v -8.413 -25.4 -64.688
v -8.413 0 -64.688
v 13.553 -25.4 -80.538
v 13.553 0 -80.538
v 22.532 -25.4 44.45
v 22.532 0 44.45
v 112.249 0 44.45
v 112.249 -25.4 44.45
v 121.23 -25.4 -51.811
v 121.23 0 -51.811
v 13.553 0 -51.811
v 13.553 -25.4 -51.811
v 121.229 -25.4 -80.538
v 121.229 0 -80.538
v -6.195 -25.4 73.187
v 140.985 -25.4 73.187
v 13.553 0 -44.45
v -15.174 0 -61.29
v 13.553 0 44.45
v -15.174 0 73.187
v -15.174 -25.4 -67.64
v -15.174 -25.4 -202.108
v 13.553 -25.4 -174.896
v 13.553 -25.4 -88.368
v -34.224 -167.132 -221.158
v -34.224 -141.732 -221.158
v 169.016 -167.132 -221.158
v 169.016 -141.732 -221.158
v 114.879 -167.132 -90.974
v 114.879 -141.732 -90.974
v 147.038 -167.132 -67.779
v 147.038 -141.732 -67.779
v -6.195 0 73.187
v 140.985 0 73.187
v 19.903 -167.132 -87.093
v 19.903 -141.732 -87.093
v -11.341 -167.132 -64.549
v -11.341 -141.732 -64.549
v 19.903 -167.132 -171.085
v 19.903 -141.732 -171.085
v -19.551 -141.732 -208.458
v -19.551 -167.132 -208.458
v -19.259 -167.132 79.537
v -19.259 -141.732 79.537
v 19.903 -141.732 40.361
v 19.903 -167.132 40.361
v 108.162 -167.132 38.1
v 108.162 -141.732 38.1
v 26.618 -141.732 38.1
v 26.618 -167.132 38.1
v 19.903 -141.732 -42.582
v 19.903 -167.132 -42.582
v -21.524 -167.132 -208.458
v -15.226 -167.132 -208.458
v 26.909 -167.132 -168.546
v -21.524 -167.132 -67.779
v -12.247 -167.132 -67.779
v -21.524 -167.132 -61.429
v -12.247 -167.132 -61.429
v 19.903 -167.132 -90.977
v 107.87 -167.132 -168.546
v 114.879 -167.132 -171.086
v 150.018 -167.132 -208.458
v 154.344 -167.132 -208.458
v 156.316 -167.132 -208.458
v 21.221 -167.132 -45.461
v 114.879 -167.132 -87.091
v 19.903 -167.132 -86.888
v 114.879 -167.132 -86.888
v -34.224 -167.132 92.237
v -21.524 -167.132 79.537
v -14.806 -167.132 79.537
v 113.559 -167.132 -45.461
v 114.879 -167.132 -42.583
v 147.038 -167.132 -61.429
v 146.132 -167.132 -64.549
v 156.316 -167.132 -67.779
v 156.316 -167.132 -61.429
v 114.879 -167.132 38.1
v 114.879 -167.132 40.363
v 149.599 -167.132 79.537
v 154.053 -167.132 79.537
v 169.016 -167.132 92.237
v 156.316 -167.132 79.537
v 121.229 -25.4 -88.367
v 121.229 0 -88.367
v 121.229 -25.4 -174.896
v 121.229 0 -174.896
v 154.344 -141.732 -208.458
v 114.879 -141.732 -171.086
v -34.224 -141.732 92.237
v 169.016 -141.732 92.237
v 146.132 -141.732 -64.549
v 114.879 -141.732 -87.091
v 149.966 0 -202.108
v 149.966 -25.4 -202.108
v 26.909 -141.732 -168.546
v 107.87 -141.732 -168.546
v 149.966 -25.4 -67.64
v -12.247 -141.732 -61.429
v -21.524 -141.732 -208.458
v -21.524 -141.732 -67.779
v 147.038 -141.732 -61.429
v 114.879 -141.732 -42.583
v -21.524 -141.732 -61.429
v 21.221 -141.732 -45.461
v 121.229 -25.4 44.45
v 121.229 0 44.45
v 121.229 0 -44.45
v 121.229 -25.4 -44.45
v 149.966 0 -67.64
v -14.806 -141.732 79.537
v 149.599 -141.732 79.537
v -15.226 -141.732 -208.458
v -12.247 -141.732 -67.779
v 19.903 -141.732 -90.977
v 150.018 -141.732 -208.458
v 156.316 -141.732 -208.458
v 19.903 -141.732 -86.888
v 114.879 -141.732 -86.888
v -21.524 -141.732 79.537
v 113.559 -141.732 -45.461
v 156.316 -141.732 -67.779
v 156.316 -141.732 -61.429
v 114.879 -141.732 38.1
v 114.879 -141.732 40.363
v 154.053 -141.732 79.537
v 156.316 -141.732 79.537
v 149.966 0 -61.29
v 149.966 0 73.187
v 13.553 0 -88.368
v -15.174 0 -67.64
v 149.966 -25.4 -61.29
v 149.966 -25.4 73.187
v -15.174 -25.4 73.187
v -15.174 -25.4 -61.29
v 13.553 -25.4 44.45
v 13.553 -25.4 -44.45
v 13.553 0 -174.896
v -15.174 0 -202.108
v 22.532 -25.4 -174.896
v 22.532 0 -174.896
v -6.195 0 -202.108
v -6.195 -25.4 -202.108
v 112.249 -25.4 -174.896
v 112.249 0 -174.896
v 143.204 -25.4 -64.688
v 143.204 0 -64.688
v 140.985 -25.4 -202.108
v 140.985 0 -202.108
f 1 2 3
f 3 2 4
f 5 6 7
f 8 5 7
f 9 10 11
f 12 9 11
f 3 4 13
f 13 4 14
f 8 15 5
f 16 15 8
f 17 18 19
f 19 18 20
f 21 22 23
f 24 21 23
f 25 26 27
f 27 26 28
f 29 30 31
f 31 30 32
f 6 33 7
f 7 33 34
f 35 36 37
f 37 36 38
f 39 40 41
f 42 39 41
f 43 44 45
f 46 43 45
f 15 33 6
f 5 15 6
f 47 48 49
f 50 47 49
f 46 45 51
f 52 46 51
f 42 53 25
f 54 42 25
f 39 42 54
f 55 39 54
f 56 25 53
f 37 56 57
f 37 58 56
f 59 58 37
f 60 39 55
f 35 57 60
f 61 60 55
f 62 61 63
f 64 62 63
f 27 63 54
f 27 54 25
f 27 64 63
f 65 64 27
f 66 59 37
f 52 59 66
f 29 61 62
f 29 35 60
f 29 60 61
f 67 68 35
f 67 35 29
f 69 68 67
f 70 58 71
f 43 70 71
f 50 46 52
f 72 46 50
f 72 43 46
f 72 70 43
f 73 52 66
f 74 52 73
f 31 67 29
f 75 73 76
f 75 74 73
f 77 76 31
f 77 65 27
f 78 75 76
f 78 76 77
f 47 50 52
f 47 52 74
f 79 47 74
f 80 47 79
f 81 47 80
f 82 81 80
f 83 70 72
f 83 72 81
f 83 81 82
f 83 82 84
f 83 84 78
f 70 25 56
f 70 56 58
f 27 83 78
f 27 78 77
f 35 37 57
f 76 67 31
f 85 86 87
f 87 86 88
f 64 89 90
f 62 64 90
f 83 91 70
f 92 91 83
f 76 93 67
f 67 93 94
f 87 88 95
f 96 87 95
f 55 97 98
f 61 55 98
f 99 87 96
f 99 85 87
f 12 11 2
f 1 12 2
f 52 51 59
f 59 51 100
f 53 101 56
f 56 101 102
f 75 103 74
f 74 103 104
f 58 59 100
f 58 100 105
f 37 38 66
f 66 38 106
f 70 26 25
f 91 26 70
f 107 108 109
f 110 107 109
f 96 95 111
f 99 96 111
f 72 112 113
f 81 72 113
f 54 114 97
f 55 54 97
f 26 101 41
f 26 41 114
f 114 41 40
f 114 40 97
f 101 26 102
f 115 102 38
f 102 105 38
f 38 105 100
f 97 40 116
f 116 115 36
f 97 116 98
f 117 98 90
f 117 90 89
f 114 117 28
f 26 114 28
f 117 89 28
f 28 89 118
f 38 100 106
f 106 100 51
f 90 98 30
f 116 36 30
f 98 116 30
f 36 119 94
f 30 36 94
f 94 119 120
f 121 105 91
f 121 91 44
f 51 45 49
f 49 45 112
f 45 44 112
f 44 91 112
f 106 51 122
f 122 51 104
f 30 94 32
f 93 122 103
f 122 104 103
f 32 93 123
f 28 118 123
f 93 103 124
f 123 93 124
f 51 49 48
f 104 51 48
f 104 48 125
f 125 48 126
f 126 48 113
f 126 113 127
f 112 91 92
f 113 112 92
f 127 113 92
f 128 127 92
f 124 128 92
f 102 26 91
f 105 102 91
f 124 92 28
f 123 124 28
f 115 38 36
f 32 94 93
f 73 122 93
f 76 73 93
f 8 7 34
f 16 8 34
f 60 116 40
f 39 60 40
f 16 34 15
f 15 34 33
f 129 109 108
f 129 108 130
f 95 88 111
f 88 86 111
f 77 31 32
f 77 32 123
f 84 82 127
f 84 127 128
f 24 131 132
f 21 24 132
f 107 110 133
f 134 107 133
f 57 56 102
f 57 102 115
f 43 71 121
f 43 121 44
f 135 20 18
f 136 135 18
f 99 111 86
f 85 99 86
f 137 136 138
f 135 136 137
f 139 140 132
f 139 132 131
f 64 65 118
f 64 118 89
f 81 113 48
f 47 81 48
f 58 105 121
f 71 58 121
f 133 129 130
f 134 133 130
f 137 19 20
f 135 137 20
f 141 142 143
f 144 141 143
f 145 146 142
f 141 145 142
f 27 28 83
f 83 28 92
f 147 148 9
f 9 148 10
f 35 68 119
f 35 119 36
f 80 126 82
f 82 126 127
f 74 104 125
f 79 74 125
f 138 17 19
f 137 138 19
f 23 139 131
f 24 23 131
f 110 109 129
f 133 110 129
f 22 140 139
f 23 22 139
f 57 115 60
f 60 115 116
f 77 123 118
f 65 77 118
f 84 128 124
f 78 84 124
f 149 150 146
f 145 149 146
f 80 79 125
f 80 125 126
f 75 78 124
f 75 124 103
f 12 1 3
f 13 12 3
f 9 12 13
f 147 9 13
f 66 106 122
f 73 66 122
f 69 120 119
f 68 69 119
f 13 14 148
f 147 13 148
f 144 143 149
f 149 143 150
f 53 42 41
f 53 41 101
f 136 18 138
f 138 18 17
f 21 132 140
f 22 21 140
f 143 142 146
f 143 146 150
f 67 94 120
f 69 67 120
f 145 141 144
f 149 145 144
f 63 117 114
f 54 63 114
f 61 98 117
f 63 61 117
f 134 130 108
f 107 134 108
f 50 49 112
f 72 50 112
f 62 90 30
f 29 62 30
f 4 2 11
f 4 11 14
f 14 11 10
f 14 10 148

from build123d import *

# Parameters (mm, degrees)
F1_DEPTH = 25.4
F3_W     = 203.2396654825
F3_H     = 313.3949062689
F4_DEPTH = 25.4


# Not quite as in the source:
# - a feature names something its author has since deleted; it is built from what else it names


with BuildPart() as f1:
    # F0 (on Front) → F1 (new body)
    with BuildSketch(Plane.XZ):
        Polygon((-15.1739238592, -61.2904866815), (13.5534761408, -44.45), (13.5534761408, 44.45), (-15.1739238592, 73.1868195874), align=None)
    extrude(amount=F1_DEPTH)


with BuildPart() as f1b:
    # F0 (on Front) → F1, piece 2 (new body)
    with BuildSketch(Plane.XZ):
        Polygon((140.9854855022, 73.1868195874), (-6.195139428, 73.1868195874), (22.532260572, 44.45), (112.2486659148, 44.45), align=None)
    extrude(amount=F1_DEPTH)


with BuildPart() as f1c:
    # F0 (on Front) → F1, piece 3 (new body)
    with BuildSketch(Plane.XZ):
        Polygon((149.9657416234, -61.2904866815), (149.9657416233, 73.1868195874), (121.2289220359, 44.45), (121.228922036, -44.45), align=None)
    extrude(amount=F1_DEPTH)


with BuildPart() as f1d:
    # F0 (on Front) → F1, piece 4 (new body)
    with BuildSketch(Plane.XZ):
        Polygon((121.228922036, -174.8955888238), (149.9657416234, -202.1080866815), (149.9657416234, -67.6404866815), (121.228922036, -88.3673402517), align=None)
    extrude(amount=F1_DEPTH)


with BuildPart() as f1e:
    # F0 (on Front) → F1, piece 5 (new body)
    with BuildSketch(Plane.XZ):
        Polygon((13.5534761408, -88.368464908), (-15.1739238592, -67.6404866815), (-15.1739238592, -202.1080866815), (13.5534761408, -174.8955888238), align=None)
    extrude(amount=F1_DEPTH)


with BuildPart() as f1f:
    # F0 (on Front) → F1, piece 6 (new body)
    with BuildSketch(Plane.XZ):
        Polygon((22.532260572, -174.8955888238), (-6.195139428, -202.1080866815), (140.9854855022, -202.1080866815), (112.2486659148, -174.8955888238), align=None)
    extrude(amount=F1_DEPTH)


with BuildPart() as f1g:
    # F0 (on Front) → F1, piece 7 (new body)
    with BuildSketch(Plane.XZ):
        Polygon((13.5534761408, -51.8106613985), (-8.4134451263, -64.6880413574), (13.5534761408, -80.5380613985), (121.2287825639, -80.5380613985), (143.2040990216, -64.6880413574), (121.2299748981, -51.8106613985), align=None)
    extrude(amount=F1_DEPTH)


with BuildPart() as f4:
    # F3 (on offset) → F4 (new body)
    with BuildSketch(Plane.XZ.offset(141.732)):
        with Locations((67.3959088821, -64.460633547)):
            Rectangle(F3_W, F3_H)
        Polygon((-21.5239238592, 79.5368195874), (-19.2591887281, 79.5368195874), (-14.8057116502, 79.5368195874), (149.5985100447, 79.5368195874), (154.0527170808, 79.5368195874), (156.3157416234, 79.5368195874), (156.3157416234, -61.4293413488), (156.3157416234, -67.7793413488), (156.3157416234, -208.4580866815), (154.3441700366, -208.4580866815), (150.0184539651, -208.4580866815), (-15.22550768, -208.4580866815), (-19.550556387, -208.4580866815), (-21.5239238592, -208.4580866815), (-21.5239238592, -67.7793892541), (-21.5239238592, -61.4293413488), align=None, mode=Mode.SUBTRACT)
        Polygon((19.9034761408, 40.3613134539), (19.9034761408, 38.1), (19.9034761408, -42.5824095103), (-12.2466249778, -61.4293413488), (-21.5239238592, -61.4293413488), (-21.5239238592, -67.7793892541), (-12.2466249778, -67.7793892541), (19.9034761408, -90.9769844408), (19.9034761408, -168.5455888238), (19.9034761408, -171.0846113359), (-19.550556387, -208.4580866815), (-15.22550768, -208.4580866815), (26.9088930999, -168.5455888237), (107.8702375016, -168.5455888238), (150.0184539651, -208.4580866815), (154.3441700366, -208.4580866815), (114.878922036, -171.0862413594), (114.878922036, -168.5455888238), (114.878922036, -90.974367478), (147.0377482149, -67.7793413488), (156.3157416234, -67.7793413488), (156.3157416234, -61.4293413488), (147.0377482149, -61.4293413488), (114.878922036, -42.5834742092), (114.878922036, 38.1), (114.8789220359, 40.3630245425), (154.0527170808, 79.5368195874), (149.5985100447, 79.5368195874), (108.1616904574, 38.1), (26.617525441, 38.1), (-14.8057116502, 79.5368195874), (-19.2591887281, 79.5368195874), align=None)
        Polygon((-11.340707376, -64.549165216), (21.2214801035, -45.4606613985), (113.5591913096, -45.4606613985), (146.13209243, -64.5491866901), (114.878922036, -87.090995271), (114.878922036, -86.8880613985), (19.9034761408, -86.8880613985), (19.9034761408, -87.0931043), align=None, mode=Mode.SUBTRACT)
    extrude(amount=F4_DEPTH)


solid = Compound([f1.part, f1b.part, f1c.part, f1d.part, f1e.part, f1f.part, f1g.part, f4.part])
